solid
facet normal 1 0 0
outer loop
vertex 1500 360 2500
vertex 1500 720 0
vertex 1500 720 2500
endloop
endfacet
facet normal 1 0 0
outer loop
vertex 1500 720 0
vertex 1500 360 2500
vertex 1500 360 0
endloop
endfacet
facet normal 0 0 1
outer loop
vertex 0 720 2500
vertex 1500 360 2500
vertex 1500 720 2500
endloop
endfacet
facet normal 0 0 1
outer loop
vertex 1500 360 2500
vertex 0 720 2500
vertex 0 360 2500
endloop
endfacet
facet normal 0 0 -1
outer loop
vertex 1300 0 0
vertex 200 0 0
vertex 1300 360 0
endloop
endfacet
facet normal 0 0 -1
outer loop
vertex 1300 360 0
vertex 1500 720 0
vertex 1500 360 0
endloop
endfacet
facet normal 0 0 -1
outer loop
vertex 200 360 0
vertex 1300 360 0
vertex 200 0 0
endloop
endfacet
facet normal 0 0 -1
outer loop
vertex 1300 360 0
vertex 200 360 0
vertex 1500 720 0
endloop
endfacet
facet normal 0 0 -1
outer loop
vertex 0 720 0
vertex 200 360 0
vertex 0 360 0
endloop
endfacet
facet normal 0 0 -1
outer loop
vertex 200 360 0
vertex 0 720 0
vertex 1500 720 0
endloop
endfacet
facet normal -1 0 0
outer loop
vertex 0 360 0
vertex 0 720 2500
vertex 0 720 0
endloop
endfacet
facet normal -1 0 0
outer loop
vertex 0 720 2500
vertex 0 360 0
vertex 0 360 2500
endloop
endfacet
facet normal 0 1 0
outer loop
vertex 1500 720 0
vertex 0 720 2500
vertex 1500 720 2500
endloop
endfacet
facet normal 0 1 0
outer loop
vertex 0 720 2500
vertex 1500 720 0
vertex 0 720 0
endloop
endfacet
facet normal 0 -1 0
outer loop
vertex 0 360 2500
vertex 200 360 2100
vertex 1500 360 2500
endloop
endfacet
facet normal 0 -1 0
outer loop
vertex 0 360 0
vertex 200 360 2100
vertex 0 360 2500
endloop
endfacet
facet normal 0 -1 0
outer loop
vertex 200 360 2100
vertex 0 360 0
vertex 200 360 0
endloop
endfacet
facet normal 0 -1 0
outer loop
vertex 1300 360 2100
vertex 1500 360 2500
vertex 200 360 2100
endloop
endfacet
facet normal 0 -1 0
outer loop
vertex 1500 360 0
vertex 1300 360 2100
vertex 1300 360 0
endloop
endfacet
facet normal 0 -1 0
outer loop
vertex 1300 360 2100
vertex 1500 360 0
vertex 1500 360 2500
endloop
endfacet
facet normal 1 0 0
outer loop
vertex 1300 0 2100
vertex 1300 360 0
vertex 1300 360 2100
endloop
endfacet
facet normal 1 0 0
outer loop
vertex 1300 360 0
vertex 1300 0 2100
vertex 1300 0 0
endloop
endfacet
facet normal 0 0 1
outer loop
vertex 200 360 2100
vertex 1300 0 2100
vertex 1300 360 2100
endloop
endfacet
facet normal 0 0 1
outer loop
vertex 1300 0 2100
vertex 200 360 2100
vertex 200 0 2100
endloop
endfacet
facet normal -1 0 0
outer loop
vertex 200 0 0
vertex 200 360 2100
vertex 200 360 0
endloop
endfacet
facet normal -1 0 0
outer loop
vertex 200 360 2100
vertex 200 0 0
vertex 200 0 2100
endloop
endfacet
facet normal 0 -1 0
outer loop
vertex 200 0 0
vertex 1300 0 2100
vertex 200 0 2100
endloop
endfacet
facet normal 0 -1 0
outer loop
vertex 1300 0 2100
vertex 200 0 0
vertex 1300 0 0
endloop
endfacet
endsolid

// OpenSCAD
//Eingangsbereich

//150cmx250cm

//(1500x2500) mm

//Ideen: Lüftung, Schiene, Katzentüre (wirklich? Katze soll doch eh nicht da raus...)

w=1500;
h=2500;

//Dicke Holz (Hasutüre 36cm)
t=360; //wieviel Platz haben wir wirklich zur Garage?

translate([0,t,0])
cube([w, t, h]);

//Größe Haustüre
hh=2100;
bh=1100;
//Abstand Rahmen
ar=100;

translate([w-ar*2-bh,0,0]) //da kann ich es ja gleich mittig setzen, dann aber mit genauen Maßen 1450?
color("white")
cube([bh,t,hh]);
